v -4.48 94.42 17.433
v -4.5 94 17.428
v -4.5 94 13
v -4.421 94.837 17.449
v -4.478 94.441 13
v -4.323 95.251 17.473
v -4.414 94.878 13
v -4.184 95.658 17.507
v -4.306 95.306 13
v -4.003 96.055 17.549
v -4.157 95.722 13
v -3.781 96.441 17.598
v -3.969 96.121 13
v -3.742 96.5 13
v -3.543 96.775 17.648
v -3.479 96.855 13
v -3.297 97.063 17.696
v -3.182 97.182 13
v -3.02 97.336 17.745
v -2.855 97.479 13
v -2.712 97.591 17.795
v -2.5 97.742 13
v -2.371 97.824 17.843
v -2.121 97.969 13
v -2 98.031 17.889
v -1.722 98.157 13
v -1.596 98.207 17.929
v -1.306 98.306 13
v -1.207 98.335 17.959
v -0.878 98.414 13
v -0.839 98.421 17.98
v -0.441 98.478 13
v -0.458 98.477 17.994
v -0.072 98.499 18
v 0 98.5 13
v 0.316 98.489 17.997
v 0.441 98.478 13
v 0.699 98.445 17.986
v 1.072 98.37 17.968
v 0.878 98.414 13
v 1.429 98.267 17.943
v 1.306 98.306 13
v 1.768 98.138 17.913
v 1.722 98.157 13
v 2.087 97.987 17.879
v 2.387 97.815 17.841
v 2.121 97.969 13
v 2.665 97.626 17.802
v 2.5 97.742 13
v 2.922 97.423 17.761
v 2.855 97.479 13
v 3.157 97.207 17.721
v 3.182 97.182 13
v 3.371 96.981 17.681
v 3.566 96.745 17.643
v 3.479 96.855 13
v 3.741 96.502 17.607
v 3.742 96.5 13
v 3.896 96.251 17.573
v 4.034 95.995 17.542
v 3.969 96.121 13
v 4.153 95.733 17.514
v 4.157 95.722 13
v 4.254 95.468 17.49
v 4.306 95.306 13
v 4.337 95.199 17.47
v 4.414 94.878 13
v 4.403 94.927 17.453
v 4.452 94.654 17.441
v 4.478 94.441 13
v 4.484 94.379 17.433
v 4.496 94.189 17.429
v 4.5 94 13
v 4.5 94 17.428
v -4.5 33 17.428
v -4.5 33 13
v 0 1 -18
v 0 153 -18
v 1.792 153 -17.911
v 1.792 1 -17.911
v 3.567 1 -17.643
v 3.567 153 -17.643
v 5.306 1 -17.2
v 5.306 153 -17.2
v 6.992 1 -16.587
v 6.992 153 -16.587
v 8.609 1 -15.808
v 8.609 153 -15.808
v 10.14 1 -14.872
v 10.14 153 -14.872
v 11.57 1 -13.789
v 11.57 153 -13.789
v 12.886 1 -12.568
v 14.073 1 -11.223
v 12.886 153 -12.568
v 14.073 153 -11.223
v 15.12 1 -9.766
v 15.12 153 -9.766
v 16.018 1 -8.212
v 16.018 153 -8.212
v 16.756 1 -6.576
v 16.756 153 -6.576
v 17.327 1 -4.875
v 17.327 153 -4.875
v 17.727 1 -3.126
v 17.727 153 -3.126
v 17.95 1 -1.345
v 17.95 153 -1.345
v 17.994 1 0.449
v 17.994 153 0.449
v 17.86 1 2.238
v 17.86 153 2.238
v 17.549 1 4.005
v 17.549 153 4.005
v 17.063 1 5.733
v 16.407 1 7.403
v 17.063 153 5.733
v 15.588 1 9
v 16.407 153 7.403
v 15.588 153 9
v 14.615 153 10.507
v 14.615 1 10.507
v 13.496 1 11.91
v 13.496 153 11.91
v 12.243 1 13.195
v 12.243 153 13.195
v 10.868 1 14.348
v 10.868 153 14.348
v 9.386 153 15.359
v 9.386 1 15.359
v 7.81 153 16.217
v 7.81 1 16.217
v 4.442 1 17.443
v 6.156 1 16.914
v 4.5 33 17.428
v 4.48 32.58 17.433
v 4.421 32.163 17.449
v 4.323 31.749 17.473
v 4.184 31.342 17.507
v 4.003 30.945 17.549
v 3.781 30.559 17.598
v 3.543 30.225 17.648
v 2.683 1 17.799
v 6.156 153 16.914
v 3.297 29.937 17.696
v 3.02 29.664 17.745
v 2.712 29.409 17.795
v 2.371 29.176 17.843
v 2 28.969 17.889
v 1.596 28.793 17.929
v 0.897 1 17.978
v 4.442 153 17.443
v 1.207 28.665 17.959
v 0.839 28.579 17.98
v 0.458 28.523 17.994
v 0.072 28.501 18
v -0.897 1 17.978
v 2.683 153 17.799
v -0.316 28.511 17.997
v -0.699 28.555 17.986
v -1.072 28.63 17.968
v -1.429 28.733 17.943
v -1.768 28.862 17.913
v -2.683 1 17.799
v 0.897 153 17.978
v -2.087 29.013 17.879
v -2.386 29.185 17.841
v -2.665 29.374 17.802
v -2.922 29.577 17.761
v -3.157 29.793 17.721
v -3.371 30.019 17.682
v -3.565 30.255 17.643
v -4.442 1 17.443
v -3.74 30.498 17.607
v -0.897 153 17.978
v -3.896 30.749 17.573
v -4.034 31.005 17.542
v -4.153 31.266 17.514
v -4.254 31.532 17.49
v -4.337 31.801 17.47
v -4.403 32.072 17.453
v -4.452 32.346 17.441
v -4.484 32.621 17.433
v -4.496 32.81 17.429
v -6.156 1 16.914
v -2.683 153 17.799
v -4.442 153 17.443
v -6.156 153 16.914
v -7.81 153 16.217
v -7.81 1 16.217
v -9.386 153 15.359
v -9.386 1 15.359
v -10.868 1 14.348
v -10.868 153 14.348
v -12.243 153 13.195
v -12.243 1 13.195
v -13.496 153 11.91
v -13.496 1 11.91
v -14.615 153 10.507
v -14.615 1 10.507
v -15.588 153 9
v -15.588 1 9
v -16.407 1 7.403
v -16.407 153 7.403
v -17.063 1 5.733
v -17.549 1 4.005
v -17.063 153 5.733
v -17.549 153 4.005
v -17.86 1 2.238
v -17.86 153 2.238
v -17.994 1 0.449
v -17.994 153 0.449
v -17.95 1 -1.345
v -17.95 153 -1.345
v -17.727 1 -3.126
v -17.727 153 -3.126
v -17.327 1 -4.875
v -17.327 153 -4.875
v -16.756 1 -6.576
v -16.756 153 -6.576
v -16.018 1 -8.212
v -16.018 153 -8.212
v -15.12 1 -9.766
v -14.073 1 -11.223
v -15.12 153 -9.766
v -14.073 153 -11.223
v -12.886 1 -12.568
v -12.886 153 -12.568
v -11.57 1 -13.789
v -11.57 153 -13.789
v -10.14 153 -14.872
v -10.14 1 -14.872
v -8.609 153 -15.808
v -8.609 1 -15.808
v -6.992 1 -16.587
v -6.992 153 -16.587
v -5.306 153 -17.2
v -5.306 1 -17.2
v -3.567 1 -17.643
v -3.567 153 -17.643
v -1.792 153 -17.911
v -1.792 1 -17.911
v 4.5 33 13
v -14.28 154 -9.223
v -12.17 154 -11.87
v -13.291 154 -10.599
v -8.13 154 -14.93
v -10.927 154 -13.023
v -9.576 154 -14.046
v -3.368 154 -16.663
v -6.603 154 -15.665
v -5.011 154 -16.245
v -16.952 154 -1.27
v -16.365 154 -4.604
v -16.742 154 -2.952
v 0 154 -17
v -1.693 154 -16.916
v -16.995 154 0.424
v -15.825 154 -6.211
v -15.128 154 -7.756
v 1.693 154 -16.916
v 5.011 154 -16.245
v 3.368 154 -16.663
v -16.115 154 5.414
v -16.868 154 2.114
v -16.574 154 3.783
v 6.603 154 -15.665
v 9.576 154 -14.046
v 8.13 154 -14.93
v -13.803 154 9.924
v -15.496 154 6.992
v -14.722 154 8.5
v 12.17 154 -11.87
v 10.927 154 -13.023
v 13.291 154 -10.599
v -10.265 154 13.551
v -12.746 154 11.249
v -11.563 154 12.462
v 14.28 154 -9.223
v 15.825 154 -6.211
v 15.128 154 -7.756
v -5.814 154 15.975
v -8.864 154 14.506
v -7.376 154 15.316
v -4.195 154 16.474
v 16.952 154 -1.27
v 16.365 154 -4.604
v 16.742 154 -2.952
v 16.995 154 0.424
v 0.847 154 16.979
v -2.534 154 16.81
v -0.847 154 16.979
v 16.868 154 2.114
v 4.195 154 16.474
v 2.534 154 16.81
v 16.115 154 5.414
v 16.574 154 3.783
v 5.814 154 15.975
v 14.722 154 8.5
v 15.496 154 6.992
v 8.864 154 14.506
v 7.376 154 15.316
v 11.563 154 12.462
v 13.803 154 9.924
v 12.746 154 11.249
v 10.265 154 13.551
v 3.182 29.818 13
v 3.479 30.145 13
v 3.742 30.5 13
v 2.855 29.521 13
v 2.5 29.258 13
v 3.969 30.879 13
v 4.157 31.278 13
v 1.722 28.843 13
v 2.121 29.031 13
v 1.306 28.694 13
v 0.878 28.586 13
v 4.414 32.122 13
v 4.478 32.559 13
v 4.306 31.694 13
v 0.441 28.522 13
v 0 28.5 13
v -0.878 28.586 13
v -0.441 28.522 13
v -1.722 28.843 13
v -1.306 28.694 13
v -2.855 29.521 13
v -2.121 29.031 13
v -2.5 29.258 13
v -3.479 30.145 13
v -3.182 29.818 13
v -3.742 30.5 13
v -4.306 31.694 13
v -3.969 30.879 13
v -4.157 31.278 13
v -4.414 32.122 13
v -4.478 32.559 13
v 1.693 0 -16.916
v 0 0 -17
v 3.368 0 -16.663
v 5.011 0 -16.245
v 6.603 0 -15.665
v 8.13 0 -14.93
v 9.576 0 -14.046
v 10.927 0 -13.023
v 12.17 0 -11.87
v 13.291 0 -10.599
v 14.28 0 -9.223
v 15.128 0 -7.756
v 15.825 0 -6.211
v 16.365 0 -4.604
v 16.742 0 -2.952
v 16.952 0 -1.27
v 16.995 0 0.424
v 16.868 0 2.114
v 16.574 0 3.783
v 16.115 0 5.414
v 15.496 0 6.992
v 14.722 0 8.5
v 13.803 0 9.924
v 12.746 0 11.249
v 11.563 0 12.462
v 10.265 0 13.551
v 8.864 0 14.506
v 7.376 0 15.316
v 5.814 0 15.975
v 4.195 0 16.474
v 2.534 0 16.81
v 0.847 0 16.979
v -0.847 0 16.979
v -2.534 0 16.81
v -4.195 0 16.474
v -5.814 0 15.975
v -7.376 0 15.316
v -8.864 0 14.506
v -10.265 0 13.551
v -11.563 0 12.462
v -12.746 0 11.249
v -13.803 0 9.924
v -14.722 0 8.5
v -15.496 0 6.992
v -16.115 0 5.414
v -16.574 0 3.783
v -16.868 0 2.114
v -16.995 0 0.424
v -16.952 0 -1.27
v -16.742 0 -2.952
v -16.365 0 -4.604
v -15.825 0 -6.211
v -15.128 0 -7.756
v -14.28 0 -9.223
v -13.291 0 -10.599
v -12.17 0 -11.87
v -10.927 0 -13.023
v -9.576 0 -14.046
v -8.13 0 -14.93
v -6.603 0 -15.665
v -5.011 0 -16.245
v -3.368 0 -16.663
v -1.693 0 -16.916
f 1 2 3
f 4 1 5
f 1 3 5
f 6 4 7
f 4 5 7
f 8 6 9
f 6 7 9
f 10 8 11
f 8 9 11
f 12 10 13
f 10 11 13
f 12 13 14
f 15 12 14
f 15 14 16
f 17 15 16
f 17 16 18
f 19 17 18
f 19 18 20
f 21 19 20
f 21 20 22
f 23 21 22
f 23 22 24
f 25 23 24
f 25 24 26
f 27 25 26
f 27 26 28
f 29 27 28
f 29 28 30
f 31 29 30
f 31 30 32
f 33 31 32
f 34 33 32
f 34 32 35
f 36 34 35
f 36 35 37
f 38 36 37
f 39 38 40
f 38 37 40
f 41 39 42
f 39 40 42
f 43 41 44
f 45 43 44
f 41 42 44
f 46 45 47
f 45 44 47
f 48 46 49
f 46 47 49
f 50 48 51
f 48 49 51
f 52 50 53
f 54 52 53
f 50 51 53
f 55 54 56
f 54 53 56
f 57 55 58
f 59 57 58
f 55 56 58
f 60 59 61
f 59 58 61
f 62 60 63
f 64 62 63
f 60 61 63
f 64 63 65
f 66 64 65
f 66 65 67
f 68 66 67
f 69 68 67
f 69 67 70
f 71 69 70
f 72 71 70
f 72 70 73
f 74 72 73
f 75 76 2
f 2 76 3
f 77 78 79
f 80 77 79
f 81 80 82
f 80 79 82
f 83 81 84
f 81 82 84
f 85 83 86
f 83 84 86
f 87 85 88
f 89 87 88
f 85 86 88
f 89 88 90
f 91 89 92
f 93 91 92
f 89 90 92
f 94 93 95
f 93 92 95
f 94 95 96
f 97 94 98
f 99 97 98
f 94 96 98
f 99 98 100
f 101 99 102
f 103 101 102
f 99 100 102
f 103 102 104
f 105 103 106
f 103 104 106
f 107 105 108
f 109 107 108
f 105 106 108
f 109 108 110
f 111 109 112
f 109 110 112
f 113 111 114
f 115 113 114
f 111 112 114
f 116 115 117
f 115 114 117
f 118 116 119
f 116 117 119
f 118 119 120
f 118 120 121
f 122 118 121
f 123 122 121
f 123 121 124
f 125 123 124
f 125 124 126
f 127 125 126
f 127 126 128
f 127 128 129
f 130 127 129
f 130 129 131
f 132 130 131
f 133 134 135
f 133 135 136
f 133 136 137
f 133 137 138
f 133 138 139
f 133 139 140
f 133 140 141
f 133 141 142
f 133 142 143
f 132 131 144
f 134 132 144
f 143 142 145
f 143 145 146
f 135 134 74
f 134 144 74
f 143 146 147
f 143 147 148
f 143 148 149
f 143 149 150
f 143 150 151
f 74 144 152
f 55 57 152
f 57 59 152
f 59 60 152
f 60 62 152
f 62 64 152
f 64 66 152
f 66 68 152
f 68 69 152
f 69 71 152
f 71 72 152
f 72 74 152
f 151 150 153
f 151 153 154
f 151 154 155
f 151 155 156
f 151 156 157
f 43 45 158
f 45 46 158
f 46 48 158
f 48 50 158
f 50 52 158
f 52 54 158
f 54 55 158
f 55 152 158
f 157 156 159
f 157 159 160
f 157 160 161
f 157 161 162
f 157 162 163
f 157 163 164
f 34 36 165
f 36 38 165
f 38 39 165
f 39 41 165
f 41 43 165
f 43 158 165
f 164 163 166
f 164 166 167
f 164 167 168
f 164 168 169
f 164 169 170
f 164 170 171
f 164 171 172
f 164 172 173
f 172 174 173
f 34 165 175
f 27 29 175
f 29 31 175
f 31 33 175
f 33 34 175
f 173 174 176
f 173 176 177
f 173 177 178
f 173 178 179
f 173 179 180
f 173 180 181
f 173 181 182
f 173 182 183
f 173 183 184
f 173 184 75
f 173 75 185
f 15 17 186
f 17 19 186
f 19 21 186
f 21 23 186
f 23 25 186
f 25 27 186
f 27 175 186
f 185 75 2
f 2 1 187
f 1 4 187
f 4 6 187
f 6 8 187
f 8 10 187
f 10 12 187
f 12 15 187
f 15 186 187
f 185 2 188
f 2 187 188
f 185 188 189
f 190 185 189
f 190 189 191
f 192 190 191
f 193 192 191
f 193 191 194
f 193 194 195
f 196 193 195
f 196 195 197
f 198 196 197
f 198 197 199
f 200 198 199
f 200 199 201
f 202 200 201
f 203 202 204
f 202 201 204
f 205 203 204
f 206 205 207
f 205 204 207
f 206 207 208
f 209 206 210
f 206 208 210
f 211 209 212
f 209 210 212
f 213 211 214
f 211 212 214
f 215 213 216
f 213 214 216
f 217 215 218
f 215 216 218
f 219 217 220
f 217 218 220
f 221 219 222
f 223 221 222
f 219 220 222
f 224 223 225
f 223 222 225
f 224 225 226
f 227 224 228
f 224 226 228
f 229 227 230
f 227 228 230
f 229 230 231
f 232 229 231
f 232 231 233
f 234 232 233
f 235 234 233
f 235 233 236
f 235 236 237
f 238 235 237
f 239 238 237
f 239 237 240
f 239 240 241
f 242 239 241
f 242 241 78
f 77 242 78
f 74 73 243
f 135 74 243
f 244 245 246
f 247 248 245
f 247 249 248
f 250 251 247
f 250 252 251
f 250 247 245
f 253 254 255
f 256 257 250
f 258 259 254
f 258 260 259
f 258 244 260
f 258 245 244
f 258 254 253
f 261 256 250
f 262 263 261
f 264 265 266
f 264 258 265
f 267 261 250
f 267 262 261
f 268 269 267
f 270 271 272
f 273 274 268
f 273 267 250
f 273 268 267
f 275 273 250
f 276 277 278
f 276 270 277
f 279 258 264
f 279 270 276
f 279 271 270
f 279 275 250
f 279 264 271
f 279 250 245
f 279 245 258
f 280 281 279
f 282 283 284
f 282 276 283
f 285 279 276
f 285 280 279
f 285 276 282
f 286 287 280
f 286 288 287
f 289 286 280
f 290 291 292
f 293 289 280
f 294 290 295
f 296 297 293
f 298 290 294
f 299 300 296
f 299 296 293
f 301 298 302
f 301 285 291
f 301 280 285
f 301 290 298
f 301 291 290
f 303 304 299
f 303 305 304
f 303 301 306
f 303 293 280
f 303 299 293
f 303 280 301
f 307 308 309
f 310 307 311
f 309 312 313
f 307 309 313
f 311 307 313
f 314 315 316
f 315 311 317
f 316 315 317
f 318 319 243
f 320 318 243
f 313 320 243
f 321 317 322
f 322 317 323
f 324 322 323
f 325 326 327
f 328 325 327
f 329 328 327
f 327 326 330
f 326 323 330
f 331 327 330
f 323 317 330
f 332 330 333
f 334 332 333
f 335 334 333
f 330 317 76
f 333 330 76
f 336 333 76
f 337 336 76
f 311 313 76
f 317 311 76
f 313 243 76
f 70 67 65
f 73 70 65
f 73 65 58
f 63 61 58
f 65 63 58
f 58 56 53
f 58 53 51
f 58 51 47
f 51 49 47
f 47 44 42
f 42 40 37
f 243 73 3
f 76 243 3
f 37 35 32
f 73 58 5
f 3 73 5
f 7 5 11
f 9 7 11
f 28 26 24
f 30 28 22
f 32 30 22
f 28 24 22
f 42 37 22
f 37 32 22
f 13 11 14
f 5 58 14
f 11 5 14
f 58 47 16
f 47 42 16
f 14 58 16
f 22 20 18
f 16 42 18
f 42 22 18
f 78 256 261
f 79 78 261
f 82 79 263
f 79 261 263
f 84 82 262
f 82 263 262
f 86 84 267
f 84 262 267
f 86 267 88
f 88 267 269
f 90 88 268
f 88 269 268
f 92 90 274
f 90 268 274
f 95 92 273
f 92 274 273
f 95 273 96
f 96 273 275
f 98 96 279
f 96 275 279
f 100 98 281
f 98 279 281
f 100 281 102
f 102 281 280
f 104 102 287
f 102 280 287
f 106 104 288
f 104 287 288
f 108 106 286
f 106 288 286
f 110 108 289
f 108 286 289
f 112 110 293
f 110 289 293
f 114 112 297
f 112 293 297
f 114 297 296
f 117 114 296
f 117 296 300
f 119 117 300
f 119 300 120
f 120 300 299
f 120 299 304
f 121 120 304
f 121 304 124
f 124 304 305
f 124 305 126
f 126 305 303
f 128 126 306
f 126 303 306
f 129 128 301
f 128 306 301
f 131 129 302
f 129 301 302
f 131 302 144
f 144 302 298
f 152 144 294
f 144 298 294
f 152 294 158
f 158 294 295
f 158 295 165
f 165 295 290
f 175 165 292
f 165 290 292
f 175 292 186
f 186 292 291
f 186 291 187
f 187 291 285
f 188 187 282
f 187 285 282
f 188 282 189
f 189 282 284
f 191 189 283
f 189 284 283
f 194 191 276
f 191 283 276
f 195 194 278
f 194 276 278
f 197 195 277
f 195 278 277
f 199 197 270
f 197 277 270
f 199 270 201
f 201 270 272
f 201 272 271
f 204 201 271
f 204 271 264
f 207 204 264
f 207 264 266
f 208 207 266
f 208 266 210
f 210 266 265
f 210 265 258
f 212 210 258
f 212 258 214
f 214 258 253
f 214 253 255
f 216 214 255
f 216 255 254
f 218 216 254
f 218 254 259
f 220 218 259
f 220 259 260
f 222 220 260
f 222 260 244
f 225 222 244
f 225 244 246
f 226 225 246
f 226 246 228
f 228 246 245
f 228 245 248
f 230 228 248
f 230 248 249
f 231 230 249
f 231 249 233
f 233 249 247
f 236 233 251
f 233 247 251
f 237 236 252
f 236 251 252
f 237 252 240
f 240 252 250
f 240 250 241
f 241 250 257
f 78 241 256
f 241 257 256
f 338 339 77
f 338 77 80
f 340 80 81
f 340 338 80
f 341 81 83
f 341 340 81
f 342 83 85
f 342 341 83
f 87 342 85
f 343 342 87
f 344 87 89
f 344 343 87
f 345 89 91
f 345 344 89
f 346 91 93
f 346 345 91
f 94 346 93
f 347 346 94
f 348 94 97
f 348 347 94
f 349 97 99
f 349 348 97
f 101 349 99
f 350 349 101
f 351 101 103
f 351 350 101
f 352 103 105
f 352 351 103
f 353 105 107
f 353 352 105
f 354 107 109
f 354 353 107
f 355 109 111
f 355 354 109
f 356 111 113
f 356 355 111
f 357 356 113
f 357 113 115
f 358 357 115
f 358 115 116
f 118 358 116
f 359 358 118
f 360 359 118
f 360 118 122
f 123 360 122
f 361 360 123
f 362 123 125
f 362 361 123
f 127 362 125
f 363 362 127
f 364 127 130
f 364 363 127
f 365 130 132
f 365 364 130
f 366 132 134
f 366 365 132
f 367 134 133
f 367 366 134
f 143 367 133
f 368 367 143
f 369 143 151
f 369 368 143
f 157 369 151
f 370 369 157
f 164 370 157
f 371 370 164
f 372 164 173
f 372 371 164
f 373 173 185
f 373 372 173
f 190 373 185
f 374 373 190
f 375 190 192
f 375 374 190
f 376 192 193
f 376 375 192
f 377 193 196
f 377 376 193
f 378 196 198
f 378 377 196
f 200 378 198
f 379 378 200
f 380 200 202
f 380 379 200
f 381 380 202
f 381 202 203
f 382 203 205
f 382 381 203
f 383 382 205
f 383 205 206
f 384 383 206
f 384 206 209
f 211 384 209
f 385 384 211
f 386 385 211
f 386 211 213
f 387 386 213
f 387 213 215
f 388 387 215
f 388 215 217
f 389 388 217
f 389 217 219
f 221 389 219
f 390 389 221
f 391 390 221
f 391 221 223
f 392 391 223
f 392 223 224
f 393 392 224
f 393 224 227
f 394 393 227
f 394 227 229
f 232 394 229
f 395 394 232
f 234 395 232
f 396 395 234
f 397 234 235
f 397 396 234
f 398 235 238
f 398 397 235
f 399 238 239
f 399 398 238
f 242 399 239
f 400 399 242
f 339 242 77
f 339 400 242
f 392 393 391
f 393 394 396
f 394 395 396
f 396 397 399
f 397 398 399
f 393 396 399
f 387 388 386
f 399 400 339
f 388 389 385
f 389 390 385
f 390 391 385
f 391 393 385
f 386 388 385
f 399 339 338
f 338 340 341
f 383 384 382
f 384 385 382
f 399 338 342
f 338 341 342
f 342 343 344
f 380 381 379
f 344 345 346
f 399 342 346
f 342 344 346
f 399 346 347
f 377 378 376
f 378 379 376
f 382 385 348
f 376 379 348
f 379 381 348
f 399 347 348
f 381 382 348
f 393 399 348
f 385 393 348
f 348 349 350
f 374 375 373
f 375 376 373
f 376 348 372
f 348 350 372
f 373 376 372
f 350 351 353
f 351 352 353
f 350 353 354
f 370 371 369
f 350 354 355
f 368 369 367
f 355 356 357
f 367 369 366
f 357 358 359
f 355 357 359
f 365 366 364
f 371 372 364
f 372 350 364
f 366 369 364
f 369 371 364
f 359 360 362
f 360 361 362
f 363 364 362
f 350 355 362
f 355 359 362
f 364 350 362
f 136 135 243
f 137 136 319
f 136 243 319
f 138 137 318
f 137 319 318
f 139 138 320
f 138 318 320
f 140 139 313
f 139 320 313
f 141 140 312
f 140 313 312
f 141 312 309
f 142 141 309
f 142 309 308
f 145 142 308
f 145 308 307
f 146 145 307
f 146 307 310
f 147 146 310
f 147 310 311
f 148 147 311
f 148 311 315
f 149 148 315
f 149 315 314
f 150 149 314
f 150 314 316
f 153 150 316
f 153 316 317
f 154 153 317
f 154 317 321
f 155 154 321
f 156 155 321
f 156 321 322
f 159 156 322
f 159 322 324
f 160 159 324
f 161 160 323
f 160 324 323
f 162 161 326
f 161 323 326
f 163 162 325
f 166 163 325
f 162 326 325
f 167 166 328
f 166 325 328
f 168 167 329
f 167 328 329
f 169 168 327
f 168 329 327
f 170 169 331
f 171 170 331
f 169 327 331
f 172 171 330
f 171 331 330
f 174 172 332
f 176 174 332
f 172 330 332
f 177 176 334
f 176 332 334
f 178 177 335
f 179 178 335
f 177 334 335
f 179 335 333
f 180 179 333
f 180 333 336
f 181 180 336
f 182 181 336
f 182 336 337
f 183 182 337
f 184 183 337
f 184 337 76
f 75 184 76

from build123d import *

# Parameters (mm, degrees)
ESQUISSE1_W                  = 18
ESQUISSE1_H                  = 154
ENL_V_MAT_EXTRU_1_REACH      = 160.117
ENL_V_MAT_EXTRU_1_END_RADIUS = 18
CHANFREIN1_SIZE              = 1
CHANFREIN2_SIZE              = 1


with BuildPart() as part:
    # Esquisse1 → Révolution1 (revolve)
    with BuildSketch(Plane.XY, mode=Mode.PRIVATE) as r_volution1_sk:
        with Locations((9, 77)):
            Rectangle(ESQUISSE1_W, ESQUISSE1_H)
    revolve(r_volution1_sk.sketch.rotate(Axis((0, 154, 0), (0, -1, 0)), 270), axis=Axis((0, 154, 0), (0, -1, 0)))

    # Enlèv. mat.-Extru.1: up to this cylinder (the profile starts inside it)
    enl_v_mat_extru_1_end = Plane(origin=(0, 63.5, 0), z_dir=(0, -1, 0)) * Cylinder(ENL_V_MAT_EXTRU_1_END_RADIUS, 357.234, mode=Mode.PRIVATE)
    # Esquisse2 → Enlèv. mat.-Extru.1 (cut, up to the surface)
    with BuildSketch(Plane(origin=(0, 0, 13), x_dir=(-1, 0, 0), z_dir=(0, 0, -1)), mode=Mode.PRIVATE) as enl_v_mat_extru_1_sk1:
        with BuildLine():
            Line((-4.5, 94), (-4.5, 33))
            ThreePointArc((-4.5, 33), (0, 28.5), (4.5, 33))
            Line((4.5, 33), (4.5, 94))
            ThreePointArc((4.5, 94), (0, 98.5), (-4.5, 94))
        make_face()
    enl_v_mat_extru_1_tool1 = extrude(enl_v_mat_extru_1_sk1.sketch, amount=-ENL_V_MAT_EXTRU_1_REACH, mode=Mode.PRIVATE) & enl_v_mat_extru_1_end
    add(enl_v_mat_extru_1_tool1.solids().sort_by_distance((0, 63.5, 13))[0], mode=Mode.SUBTRACT)

    # Chanfrein1
    chanfrein1_edges = [part.edges().sort_by_distance(p)[0] for p in [
        (0, 154, 18),
    ]]
    chamfer(chanfrein1_edges, length=CHANFREIN1_SIZE)

    # Chanfrein2
    chanfrein2_edges = [part.edges().sort_by_distance(p)[0] for p in [
        (0, 0, 18),
    ]]
    chamfer(chanfrein2_edges, length=CHANFREIN2_SIZE)


solid = part.part
